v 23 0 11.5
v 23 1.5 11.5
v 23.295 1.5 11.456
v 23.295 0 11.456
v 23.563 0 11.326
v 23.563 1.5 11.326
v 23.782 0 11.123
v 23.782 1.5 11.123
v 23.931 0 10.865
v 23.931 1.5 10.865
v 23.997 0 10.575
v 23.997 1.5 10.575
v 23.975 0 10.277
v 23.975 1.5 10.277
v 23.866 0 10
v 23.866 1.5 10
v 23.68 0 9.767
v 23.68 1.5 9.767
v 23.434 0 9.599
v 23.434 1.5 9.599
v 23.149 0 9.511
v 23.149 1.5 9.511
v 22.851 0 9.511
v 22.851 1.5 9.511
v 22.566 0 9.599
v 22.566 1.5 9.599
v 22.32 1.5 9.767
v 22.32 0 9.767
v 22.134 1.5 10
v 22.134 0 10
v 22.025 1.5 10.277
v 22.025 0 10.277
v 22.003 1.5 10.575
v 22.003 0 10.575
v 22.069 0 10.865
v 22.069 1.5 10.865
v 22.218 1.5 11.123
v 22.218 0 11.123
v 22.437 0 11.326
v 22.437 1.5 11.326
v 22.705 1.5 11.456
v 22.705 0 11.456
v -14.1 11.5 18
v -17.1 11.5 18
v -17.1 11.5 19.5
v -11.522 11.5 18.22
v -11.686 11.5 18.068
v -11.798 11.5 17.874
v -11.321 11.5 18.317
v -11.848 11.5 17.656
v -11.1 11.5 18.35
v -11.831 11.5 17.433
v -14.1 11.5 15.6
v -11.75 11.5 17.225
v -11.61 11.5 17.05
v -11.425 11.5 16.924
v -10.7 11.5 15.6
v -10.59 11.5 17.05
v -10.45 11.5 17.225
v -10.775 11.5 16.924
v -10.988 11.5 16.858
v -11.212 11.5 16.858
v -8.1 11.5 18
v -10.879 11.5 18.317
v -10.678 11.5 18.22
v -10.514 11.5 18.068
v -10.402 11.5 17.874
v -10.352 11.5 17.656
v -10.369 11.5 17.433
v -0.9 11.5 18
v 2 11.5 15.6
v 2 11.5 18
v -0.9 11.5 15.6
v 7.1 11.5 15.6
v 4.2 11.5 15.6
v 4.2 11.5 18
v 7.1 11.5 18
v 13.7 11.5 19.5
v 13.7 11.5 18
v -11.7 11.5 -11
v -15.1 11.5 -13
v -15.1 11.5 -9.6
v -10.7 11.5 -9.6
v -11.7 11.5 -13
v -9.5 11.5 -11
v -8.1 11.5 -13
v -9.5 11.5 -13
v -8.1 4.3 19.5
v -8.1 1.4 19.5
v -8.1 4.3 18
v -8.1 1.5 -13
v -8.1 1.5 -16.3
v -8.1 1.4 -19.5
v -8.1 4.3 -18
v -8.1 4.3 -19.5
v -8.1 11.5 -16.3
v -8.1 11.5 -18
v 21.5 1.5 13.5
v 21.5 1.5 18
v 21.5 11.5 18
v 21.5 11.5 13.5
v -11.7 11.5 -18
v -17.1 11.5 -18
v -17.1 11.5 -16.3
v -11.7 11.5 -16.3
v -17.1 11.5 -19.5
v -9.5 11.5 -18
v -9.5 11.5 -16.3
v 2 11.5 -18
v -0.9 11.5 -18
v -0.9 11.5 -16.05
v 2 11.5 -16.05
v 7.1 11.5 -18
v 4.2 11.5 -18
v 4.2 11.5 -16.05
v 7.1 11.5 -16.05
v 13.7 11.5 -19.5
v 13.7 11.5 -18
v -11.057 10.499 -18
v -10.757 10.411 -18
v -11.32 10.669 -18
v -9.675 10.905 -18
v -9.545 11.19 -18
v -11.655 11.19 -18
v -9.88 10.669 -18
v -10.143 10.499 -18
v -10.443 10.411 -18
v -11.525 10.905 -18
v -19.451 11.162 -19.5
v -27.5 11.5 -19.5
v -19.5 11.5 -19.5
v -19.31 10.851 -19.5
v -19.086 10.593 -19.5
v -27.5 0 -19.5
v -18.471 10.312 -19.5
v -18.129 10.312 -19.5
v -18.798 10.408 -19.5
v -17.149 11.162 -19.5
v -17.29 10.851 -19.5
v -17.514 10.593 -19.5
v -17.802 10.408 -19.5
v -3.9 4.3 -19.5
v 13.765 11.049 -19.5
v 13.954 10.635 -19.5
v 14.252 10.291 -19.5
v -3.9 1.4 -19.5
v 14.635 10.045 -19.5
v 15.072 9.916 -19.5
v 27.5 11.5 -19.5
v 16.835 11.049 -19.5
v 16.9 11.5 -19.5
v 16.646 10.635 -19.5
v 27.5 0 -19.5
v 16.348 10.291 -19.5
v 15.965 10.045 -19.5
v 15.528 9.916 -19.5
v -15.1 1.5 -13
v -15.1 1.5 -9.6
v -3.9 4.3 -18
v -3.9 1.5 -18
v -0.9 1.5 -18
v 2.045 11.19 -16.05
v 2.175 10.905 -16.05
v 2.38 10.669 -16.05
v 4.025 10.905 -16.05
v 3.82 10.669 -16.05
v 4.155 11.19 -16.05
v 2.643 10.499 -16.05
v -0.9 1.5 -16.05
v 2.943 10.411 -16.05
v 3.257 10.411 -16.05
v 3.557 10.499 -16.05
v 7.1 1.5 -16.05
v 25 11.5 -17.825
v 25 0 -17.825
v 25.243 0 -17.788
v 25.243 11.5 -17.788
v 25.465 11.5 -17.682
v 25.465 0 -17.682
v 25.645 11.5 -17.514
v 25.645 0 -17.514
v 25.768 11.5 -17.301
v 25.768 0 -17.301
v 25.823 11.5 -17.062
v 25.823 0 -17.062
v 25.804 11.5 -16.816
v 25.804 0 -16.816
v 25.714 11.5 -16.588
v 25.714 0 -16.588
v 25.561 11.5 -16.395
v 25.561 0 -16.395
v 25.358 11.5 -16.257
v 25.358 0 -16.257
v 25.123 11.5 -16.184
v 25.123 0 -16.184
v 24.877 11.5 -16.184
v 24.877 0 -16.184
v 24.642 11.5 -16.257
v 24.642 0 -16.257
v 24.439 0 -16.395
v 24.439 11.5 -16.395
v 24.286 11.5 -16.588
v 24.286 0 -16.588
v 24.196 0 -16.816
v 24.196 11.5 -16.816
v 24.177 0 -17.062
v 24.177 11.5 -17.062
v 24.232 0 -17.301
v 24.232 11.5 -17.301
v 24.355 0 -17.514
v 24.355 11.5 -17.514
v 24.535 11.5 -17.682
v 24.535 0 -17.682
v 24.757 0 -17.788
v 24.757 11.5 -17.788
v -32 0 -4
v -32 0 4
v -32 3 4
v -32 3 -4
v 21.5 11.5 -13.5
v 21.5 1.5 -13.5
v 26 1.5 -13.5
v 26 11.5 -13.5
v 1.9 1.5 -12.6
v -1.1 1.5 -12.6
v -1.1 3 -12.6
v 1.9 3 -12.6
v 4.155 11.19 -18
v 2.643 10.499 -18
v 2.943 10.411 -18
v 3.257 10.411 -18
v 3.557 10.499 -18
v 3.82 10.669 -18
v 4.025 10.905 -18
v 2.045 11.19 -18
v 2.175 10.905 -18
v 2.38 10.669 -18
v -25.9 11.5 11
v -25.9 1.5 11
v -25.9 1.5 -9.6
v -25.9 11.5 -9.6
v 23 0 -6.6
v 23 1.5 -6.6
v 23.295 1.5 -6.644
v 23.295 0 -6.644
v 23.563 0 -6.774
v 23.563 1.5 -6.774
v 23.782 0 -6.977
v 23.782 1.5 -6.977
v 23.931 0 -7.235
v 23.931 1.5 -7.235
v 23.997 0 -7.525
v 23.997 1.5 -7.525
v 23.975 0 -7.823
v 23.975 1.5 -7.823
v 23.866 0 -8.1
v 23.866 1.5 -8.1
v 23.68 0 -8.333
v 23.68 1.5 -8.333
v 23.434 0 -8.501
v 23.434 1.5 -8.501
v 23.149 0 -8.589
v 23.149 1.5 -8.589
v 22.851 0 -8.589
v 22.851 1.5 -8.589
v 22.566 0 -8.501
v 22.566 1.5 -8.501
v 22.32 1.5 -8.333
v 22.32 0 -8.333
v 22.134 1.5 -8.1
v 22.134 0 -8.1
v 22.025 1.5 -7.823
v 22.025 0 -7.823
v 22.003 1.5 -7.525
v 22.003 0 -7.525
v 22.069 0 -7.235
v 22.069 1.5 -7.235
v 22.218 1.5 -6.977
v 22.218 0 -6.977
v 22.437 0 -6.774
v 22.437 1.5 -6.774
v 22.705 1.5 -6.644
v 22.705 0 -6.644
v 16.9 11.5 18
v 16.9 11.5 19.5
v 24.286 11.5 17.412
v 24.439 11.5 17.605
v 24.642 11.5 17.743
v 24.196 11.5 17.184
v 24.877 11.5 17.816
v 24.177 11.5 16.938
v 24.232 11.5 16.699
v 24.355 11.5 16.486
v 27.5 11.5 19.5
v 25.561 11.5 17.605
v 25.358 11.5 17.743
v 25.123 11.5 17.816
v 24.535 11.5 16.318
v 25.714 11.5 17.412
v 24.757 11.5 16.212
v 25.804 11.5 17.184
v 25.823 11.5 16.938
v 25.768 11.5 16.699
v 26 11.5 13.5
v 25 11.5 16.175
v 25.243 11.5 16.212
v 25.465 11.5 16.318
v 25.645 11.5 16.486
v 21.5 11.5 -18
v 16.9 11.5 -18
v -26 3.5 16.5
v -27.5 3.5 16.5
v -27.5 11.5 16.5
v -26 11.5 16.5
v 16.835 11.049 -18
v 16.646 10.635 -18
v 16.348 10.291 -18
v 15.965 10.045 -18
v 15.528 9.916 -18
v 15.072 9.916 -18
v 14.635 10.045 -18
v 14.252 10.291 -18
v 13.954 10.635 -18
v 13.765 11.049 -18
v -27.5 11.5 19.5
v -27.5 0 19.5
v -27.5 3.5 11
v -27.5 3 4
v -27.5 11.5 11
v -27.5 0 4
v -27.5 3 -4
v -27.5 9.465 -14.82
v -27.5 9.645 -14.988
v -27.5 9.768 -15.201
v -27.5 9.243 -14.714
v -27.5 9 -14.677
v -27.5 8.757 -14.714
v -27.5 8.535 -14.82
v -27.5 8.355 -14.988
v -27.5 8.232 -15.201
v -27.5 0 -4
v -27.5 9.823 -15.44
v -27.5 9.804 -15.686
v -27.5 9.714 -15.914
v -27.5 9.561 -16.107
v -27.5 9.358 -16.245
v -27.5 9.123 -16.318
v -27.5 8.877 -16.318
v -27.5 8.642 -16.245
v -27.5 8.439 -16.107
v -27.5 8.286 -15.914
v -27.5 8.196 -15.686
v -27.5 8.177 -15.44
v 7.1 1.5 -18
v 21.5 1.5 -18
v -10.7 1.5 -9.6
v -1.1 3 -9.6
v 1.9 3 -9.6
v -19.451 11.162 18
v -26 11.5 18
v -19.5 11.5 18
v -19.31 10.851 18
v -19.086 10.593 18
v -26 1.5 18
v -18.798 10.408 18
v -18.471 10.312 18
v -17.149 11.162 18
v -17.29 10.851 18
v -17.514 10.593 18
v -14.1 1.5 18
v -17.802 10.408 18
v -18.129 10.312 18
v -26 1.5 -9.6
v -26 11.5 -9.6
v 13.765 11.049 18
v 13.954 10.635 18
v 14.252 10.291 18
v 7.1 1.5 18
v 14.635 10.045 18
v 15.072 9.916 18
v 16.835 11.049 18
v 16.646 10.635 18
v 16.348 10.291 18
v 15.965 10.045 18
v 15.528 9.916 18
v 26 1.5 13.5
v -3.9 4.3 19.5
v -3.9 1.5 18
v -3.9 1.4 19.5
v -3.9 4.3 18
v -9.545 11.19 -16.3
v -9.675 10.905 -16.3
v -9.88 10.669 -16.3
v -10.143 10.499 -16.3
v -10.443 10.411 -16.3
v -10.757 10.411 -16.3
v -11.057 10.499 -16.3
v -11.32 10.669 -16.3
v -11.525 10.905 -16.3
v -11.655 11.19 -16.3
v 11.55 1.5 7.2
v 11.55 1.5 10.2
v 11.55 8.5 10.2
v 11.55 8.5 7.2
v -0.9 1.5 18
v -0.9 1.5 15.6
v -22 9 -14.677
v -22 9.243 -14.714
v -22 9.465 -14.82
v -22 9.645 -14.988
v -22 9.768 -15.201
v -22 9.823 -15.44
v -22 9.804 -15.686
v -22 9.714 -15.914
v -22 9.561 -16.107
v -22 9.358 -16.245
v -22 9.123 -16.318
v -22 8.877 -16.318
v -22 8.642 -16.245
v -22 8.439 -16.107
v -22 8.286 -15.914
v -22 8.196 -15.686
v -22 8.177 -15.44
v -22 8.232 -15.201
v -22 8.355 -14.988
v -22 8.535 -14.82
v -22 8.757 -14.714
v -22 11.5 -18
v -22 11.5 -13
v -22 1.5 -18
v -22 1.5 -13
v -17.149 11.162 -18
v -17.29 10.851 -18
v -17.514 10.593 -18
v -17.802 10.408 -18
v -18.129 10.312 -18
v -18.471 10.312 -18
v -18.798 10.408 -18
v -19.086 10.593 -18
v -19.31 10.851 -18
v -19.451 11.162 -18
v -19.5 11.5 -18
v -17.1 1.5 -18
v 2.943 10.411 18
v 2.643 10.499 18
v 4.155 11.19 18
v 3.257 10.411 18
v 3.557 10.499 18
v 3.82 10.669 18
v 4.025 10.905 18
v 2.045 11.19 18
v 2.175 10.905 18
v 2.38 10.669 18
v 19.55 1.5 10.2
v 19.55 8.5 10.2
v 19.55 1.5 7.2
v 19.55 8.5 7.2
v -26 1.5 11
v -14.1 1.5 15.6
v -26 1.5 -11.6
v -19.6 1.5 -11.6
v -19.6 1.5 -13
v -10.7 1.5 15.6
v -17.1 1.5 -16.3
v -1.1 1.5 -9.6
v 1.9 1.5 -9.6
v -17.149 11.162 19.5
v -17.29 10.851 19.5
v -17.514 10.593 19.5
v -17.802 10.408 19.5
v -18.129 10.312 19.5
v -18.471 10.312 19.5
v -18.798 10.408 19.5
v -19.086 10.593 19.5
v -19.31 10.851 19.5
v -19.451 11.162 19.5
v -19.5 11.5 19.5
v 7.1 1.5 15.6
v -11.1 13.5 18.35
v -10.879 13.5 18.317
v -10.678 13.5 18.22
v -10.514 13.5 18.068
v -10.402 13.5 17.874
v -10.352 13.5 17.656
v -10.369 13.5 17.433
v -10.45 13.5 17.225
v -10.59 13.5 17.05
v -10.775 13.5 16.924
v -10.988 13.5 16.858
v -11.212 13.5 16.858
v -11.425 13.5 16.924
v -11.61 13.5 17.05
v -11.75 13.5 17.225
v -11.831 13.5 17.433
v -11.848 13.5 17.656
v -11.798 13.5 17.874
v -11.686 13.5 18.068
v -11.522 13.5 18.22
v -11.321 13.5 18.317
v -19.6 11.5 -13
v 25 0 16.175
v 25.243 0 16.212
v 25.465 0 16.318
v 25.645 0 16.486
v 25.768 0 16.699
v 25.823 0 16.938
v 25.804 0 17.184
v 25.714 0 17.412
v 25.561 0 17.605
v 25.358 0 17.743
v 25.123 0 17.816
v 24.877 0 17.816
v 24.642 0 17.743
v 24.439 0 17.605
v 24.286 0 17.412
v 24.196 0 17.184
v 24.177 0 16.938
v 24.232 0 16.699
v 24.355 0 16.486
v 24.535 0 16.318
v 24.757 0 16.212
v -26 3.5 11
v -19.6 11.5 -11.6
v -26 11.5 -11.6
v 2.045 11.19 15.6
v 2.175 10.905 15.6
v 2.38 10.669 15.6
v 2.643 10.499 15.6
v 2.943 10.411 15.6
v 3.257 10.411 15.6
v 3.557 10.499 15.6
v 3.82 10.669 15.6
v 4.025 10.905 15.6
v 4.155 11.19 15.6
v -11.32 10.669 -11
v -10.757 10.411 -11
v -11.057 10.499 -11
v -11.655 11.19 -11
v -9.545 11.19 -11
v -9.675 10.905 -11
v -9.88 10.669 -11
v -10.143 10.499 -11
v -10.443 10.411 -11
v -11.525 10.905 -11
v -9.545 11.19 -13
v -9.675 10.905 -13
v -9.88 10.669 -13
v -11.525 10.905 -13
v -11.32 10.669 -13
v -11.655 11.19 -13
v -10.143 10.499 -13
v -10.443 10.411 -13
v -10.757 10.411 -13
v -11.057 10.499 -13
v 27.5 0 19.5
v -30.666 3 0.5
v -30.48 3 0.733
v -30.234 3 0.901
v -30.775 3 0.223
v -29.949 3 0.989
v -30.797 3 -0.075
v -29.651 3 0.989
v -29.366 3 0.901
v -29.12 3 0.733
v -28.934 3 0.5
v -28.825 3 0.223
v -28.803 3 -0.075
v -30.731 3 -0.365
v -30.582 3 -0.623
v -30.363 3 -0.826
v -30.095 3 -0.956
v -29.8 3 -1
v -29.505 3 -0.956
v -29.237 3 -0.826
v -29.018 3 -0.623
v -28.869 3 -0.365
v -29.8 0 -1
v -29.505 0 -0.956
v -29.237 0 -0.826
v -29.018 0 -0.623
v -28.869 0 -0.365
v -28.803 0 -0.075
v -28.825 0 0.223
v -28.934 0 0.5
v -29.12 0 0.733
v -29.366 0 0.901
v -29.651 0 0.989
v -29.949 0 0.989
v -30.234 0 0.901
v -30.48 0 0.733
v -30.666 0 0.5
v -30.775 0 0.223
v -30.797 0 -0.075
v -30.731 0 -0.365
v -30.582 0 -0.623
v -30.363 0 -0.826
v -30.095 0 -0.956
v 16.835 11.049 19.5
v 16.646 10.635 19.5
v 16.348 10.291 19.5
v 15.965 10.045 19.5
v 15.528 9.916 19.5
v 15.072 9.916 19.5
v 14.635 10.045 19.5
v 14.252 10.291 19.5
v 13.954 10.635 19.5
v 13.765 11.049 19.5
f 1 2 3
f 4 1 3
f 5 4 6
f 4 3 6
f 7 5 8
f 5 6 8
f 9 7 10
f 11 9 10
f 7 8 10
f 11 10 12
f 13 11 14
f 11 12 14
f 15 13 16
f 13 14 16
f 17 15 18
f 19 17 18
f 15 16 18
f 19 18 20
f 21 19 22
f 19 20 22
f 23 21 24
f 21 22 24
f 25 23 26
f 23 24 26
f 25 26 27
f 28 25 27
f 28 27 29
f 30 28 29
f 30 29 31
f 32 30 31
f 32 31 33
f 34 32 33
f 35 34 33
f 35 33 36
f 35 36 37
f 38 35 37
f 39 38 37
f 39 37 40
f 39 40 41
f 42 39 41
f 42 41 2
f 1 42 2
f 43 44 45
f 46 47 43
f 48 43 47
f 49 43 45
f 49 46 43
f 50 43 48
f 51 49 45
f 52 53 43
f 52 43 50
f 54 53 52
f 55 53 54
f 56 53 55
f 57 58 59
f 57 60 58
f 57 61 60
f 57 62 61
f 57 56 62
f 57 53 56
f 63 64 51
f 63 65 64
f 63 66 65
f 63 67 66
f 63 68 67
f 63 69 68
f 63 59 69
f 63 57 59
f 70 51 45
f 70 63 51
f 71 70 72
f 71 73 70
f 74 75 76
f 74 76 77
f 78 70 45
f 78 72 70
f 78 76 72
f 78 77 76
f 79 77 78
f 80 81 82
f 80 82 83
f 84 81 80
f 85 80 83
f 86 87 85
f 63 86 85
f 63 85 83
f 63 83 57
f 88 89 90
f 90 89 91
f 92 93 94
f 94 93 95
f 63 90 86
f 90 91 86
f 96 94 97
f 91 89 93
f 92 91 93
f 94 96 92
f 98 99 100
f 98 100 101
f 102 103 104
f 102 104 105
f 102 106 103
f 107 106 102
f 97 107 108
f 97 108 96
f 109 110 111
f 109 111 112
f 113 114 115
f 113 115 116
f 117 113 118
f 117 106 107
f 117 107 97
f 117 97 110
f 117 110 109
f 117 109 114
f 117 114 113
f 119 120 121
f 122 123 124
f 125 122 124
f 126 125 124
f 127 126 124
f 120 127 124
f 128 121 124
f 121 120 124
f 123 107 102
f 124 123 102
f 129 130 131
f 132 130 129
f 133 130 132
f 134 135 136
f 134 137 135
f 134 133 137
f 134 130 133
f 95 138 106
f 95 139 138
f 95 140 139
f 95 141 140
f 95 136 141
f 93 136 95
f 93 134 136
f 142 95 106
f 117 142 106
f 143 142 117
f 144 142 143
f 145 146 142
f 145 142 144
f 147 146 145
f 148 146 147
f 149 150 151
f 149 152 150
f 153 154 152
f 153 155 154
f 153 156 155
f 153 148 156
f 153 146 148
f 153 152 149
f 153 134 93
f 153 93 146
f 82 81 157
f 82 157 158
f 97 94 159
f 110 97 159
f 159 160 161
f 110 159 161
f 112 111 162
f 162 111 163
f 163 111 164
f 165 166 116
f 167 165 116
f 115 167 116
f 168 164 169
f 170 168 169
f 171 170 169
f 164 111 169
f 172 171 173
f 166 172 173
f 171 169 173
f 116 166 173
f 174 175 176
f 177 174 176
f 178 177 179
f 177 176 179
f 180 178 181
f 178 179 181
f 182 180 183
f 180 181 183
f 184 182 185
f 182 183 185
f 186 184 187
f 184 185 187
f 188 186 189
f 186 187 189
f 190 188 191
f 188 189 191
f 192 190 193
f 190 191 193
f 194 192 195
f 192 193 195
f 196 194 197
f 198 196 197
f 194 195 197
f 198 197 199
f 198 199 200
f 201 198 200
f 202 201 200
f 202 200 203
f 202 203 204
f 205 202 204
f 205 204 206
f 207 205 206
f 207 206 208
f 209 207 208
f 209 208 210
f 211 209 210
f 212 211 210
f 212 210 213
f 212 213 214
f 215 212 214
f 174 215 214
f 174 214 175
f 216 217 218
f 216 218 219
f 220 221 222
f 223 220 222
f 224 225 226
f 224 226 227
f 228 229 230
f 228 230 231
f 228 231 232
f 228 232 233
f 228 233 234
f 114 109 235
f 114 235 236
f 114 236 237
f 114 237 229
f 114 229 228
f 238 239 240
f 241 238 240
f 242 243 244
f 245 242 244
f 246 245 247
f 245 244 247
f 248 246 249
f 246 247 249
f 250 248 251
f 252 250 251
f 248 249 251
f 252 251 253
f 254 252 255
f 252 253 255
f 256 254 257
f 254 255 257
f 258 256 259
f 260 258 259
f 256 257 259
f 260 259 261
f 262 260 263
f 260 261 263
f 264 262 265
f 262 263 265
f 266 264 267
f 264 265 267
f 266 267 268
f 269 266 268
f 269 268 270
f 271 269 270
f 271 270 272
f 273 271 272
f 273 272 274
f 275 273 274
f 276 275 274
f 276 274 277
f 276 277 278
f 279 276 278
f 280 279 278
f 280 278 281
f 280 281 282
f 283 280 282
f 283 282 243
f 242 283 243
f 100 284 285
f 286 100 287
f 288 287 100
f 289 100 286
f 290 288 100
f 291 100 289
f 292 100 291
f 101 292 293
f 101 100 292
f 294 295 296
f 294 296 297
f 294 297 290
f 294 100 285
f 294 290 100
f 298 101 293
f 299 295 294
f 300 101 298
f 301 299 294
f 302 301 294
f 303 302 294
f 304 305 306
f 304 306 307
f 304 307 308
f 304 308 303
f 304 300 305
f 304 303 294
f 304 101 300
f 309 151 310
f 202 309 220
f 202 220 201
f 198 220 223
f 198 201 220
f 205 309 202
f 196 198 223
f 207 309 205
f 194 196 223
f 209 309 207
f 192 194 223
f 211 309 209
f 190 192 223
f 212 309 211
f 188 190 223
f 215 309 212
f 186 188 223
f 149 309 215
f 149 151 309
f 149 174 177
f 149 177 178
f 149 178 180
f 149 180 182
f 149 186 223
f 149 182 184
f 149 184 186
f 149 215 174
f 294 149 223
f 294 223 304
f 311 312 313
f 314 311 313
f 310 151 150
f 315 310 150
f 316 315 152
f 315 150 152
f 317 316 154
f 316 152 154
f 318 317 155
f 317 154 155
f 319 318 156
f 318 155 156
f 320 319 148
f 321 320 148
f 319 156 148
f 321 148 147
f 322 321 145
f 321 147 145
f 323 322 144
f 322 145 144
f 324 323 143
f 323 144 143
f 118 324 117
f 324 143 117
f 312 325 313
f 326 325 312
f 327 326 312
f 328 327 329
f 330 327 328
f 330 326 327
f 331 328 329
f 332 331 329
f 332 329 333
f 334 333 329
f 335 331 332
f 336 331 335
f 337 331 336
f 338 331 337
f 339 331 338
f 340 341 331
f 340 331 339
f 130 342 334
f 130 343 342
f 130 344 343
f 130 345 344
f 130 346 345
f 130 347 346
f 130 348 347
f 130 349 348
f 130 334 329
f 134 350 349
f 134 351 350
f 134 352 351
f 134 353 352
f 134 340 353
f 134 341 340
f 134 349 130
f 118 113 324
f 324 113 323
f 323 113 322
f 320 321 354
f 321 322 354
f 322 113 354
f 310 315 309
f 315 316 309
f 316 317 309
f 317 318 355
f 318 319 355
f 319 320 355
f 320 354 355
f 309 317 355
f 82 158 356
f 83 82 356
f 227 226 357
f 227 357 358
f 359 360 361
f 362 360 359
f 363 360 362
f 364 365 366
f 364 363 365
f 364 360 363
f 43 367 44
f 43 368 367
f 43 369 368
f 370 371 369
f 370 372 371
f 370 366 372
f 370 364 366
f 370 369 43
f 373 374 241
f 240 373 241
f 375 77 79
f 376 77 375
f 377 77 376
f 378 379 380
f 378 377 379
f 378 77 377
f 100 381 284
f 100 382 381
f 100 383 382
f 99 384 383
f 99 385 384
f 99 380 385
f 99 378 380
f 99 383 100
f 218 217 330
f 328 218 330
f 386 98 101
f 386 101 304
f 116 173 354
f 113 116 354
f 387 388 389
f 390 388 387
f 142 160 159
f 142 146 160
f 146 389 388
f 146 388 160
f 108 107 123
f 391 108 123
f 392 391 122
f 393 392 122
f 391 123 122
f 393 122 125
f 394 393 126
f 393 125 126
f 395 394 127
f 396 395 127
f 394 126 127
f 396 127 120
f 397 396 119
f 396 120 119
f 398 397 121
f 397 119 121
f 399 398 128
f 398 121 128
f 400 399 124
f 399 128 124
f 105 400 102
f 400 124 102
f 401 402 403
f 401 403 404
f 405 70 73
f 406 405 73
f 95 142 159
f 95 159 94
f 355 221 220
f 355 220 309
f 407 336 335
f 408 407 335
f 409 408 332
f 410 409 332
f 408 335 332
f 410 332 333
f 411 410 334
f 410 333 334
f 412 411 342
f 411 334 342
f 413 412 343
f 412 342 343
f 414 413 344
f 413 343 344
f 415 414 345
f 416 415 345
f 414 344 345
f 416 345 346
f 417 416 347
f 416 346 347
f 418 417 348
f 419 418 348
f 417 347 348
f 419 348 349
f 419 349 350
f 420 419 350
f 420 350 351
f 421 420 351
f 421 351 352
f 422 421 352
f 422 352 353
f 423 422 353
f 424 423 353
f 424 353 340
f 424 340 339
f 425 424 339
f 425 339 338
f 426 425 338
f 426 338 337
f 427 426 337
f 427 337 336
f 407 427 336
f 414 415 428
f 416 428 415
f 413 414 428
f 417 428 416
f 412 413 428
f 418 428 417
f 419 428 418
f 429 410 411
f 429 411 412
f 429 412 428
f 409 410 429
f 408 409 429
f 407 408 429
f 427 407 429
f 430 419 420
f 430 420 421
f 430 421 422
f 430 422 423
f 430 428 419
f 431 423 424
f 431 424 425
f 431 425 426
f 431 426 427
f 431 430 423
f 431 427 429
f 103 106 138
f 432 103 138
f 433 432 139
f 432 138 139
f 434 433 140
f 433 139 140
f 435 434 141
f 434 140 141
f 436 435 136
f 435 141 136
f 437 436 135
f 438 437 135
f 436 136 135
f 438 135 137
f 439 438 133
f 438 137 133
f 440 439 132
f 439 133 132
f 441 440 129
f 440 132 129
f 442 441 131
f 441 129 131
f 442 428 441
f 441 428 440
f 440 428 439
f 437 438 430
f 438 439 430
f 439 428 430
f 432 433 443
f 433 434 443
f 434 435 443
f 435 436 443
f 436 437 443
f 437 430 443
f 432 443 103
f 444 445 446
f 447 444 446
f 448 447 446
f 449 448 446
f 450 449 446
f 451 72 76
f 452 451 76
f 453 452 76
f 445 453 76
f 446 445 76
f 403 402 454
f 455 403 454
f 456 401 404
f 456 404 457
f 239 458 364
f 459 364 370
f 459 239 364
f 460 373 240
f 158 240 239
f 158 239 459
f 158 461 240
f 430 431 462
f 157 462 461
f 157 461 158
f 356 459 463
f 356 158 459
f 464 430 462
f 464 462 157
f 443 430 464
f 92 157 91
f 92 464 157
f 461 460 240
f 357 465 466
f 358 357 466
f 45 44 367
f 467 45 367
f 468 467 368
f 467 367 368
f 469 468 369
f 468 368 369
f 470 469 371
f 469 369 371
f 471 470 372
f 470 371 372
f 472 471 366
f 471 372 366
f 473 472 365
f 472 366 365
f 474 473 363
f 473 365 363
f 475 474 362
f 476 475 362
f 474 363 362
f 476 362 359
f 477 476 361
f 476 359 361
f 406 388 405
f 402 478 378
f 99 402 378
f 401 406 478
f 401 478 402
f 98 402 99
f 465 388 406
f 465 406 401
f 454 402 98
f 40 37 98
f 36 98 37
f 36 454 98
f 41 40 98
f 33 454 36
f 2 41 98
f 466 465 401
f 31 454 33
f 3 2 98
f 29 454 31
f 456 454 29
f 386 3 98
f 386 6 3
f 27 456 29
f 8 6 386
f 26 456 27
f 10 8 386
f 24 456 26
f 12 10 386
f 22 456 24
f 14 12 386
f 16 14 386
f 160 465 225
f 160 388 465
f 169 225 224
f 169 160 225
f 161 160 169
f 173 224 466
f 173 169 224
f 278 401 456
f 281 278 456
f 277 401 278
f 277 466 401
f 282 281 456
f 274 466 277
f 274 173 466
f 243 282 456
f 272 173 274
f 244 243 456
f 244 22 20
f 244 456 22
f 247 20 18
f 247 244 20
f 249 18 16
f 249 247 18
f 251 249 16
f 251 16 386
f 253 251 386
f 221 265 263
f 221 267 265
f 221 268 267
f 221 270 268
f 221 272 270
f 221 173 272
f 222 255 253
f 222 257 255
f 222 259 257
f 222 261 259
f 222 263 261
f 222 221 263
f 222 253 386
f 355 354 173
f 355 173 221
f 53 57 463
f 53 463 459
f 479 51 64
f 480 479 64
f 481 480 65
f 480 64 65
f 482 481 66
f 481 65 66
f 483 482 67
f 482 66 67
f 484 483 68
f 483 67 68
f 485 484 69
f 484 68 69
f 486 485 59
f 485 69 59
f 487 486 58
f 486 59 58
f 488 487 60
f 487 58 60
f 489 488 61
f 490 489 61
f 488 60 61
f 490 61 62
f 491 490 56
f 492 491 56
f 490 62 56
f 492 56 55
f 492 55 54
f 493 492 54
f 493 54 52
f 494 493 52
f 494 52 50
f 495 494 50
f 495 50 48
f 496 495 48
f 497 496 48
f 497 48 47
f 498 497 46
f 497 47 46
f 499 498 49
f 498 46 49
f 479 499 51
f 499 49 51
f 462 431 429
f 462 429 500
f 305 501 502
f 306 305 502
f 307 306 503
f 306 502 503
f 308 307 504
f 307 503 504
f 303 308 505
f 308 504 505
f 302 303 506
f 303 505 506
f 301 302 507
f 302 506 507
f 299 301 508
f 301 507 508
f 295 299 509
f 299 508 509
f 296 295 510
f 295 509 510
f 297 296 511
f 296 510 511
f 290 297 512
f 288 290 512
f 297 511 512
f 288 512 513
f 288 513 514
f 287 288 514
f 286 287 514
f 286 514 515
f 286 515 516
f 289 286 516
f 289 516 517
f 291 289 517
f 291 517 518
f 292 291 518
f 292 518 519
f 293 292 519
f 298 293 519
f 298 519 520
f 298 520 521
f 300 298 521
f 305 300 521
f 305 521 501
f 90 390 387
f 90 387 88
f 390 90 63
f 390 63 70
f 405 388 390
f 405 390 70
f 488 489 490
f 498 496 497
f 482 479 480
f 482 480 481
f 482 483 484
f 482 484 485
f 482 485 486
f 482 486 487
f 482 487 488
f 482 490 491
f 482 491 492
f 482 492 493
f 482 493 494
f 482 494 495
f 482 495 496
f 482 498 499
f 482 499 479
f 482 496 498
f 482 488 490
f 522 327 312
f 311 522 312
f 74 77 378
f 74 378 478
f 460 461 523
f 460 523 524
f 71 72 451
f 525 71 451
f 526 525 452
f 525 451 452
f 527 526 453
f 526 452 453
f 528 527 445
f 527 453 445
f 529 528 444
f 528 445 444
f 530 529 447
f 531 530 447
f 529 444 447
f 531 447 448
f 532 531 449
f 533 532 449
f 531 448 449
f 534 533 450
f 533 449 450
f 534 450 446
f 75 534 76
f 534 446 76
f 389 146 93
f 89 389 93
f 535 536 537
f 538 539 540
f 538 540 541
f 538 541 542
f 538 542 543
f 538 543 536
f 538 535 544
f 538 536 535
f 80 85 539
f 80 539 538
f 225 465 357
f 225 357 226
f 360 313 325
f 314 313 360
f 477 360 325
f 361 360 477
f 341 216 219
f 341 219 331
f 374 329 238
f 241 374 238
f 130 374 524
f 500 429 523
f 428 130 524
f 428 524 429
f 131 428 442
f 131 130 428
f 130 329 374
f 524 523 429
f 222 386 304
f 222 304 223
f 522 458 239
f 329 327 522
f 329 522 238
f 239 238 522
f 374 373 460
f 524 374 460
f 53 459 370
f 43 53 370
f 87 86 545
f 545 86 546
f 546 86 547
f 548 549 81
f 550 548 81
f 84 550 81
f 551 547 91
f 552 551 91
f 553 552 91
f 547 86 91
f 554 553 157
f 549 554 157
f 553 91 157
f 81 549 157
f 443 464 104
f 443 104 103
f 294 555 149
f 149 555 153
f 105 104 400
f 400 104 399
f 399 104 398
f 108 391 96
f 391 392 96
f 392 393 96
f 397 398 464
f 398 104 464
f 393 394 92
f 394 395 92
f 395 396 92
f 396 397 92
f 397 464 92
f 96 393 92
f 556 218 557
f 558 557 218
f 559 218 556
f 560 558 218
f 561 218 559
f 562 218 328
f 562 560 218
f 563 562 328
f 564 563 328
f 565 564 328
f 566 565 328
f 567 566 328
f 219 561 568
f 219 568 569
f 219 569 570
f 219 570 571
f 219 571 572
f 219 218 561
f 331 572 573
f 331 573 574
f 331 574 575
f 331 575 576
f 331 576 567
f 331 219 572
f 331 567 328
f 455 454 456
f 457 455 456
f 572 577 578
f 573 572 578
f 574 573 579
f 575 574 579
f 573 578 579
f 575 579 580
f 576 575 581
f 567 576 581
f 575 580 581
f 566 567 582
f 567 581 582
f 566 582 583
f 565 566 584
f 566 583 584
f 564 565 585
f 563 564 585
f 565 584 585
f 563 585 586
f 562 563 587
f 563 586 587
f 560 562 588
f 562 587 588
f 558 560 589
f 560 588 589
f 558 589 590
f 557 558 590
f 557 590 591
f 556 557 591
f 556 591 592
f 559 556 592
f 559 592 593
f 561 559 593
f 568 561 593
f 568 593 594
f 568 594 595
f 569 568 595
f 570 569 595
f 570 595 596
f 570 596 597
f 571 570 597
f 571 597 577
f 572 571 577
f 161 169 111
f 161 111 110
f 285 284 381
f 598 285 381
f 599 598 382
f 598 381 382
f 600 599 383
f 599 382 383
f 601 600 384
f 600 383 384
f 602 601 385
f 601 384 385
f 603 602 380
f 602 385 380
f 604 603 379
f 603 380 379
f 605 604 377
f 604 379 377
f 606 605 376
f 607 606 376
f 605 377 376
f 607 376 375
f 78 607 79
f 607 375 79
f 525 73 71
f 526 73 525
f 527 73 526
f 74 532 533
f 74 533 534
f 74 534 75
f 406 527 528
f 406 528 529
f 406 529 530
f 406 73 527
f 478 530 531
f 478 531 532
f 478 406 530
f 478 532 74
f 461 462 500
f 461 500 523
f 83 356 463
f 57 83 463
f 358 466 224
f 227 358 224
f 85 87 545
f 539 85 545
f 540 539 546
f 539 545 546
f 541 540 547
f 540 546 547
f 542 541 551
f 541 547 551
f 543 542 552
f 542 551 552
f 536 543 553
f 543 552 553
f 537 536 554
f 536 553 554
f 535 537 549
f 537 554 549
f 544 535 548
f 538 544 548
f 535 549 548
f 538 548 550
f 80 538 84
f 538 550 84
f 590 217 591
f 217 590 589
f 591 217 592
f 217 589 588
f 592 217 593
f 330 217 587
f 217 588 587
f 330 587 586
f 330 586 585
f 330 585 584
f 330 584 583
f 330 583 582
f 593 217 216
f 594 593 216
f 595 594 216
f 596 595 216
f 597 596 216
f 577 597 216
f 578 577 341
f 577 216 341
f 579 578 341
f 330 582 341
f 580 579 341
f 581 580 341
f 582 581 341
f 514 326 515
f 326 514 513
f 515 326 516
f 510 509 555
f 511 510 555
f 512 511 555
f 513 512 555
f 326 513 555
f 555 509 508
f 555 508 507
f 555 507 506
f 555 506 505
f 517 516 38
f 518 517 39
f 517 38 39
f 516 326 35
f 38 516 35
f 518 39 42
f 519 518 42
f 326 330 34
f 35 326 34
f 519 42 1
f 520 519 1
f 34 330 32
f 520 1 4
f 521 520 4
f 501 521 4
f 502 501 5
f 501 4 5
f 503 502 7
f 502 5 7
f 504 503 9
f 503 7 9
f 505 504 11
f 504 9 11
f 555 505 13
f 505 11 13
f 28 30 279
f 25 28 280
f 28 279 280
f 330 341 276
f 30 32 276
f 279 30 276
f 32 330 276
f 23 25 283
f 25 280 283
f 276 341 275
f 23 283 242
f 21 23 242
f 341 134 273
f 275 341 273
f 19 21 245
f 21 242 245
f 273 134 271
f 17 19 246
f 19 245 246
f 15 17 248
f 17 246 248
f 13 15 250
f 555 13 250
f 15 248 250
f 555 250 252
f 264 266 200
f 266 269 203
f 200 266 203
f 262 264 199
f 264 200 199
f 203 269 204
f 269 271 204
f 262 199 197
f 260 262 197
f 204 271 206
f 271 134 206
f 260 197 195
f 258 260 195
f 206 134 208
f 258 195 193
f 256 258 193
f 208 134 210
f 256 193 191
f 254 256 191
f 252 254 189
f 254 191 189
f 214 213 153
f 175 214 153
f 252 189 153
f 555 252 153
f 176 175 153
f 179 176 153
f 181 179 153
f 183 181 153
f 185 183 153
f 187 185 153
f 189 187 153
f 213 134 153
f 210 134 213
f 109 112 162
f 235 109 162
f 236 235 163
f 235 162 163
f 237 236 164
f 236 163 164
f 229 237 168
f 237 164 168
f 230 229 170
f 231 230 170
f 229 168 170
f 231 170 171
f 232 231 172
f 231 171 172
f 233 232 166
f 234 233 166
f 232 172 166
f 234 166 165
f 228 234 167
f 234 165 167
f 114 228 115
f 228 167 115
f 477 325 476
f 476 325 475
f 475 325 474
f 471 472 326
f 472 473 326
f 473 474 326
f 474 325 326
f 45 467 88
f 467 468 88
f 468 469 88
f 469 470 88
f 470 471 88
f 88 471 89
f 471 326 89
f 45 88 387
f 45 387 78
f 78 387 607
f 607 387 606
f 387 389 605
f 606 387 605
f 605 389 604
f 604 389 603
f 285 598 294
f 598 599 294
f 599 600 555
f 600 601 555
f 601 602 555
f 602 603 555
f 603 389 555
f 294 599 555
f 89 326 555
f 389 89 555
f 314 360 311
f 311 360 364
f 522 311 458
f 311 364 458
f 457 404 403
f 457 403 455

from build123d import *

# Parameters (mm, degrees)
SKETCH_1_W            = 55
SKETCH_1_H            = 39
EXTRUDE_1_DEPTH       = 11.5
SHELL_1_T             = -1.5
SKETCH_2_R            = 1.6
SKETCH_2_R_2          = 1.2
SKETCH_2_W            = 4.2
SKETCH_2_H            = 2.9
CUT_EXTRUDE_1_DEPTH   = 50.086658065
SKETCH_3_W            = 0.1
SKETCH_3_H            = 20.6
SKETCH_3_W_2          = 9
SKETCH_3_H_2          = 1.7
SKETCH_3_W_3          = 8
SKETCH_3_H_3          = 1.95
SKETCH_3_H_4          = 2.4
SKETCH_3_W_4          = 4.5
SKETCH_3_H_5          = 4.5
EXTRUDE_2_DEPTH       = 10
CUT_EXTRUDE_START     = -1.5
SKETCH_4_R            = 1.1
CUT_EXTRUDE_2_DEPTH   = 36
SKETCH_5_R            = 1.1
CUT_EXTRUDE_3_DEPTH   = 7
EXTRUDE_3_DEPTH       = 1.5
EXTRUDE_3_DEPTH_BACK  = 1.5
SKETCH_6_W            = 3
SKETCH_6_H            = 3
SKETCH_6_W_2          = 4.5
SKETCH_6_H_2          = 8
SKETCH_7_R            = 1
SKETCH_7_R_2          = 0.825
CUT_EXTRUDE_4_DEPTH   = 40.198214245
SKETCH_8_R            = 1
CUT_EXTRUDE_5_DEPTH   = 39.784661917
CUT_EXTRUDE_6_REACH   = 61.477
SKETCH_9_R            = 0.825
SKETCH_10_W           = 8
SKETCH_10_H           = 3
F_3MM_4_DEPTH         = 7
CUT_EXTRUDE_4_2_REACH = 61.477
SKETCH_11_W           = 5.5
SKETCH_11_H           = 8
SKETCH_12_R           = 0.75
EXTRUDE_5_DEPTH       = 2


with BuildPart() as part:
    # 草图1 → 凸台-拉伸1 (new body)
    with BuildSketch(Plane(origin=(0, 0, 0), x_dir=(1, 0, 0), z_dir=(0, 1, 0))):
        Rectangle(SKETCH_1_W, SKETCH_1_H)
    extrude(amount=EXTRUDE_1_DEPTH)

    # 抽壳1
    shell_1_openings = [part.faces().sort_by_distance(p)[0] for p in [
        (0, 11.5, 0),
    ]]
    offset(amount=SHELL_1_T, openings=shell_1_openings, kind=Kind.INTERSECTION)

    # 草图2 → 切除-拉伸1 (cut, through all)
    with BuildSketch(Plane(origin=(0, 0, -19.5), x_dir=(-1, 0, 0), z_dir=(0, 0, -1))):
        with Locations((-15.3, 11.5)):
            Circle(SKETCH_2_R)
        with Locations((18.3, 11.5)):
            Circle(SKETCH_2_R_2)
        with Locations((6, 2.85)):
            Rectangle(SKETCH_2_W, SKETCH_2_H)
    extrude(amount=-CUT_EXTRUDE_1_DEPTH, mode=Mode.SUBTRACT)

    # 草图3 → 凸台-拉伸2 (add)
    with BuildSketch(Plane(origin=(0, 1.5, 0), x_dir=(1, 0, 0), z_dir=(0, 1, 0))):
        Polygon((-10.7, 9.6), (-10.7, -15.6), (-14.1, -15.6), (-14.1, -18), (-10.7, -18), (-8.1, -18), (-8.1, 13), (-15.1, 13), (-15.1, 9.6), align=None)
        with Locations((-25.95, -0.7)):
            Rectangle(SKETCH_3_W, SKETCH_3_H)
        with Locations((-12.6, 17.15)):
            Rectangle(SKETCH_3_W_2, SKETCH_3_H_2)
        with Locations((3.1, 17.025)):
            Rectangle(SKETCH_3_W_3, SKETCH_3_H_3)
        with Locations((3.1, -16.8)):
            Rectangle(SKETCH_3_W_3, SKETCH_3_H_4)
        with Locations((23.75, 15.75)):
            Rectangle(SKETCH_3_W_4, SKETCH_3_H_5)
        with Locations((23.75, -15.75)):
            Rectangle(SKETCH_3_W_4, SKETCH_3_H_5)
        Polygon((-26, 18), (-22, 18), (-22, 13), (-19.6, 13), (-19.6, 11.6), (-26, 11.6), (-26, 13), align=None)
    extrude(amount=EXTRUDE_2_DEPTH)

    # 草图4 → 切除-拉伸2 (cut)
    with BuildSketch(Plane.XY.offset(19.5).offset(CUT_EXTRUDE_START)):
        with Locations((3.1, 11.5)):
            Circle(SKETCH_4_R)
    extrude(amount=-CUT_EXTRUDE_2_DEPTH, mode=Mode.SUBTRACT)

    # 草图5 → 切除-拉伸3 (cut)
    with BuildSketch(Plane(origin=(0, 0, -19.5), x_dir=(-1, 0, 0), z_dir=(0, 0, -1)).offset(CUT_EXTRUDE_START)):
        with Locations((10.6, 11.5)):
            Circle(SKETCH_5_R)
    extrude(amount=-CUT_EXTRUDE_3_DEPTH, mode=Mode.SUBTRACT)

    # 草图6 → 变速卡位凸台-拉伸3 (add, two sides: drawn at the far end of the back side and taken through both)
    with BuildSketch(Plane(origin=(0, 1.5, 0), x_dir=(1, 0, 0), z_dir=(0, 1, 0)).offset(-EXTRUDE_3_DEPTH_BACK)):
        with Locations((0.4, 11.1)):
            Rectangle(SKETCH_6_W, SKETCH_6_H)
        with Locations((-29.75, 0)):
            Rectangle(SKETCH_6_W_2, SKETCH_6_H_2)
    extrude(amount=EXTRUDE_3_DEPTH + EXTRUDE_3_DEPTH_BACK)

    # 草图7 → Cut-Extrude 4 (cut, through all)
    with BuildSketch(Plane.XZ):
        with Locations(Location((-29.8, 0, 0), (0, 0, 270))):
            Circle(SKETCH_7_R)
        with Locations(Location((25, 17, 0), (0, 0, 270))):
            Circle(SKETCH_7_R_2)
        with Locations(Location((25, -17, 0), (0, 0, 270))):
            Circle(SKETCH_7_R_2)
    extrude(amount=-CUT_EXTRUDE_4_DEPTH, mode=Mode.SUBTRACT)

    # 草图8 → 底部螺丝孔切除-拉伸5 (cut, through all)
    with BuildSketch(Plane(origin=(0, 1.5, 0), x_dir=(1, 0, 0), z_dir=(0, 1, 0))):
        with Locations(Location((23, 7.6, 0), (0, 0, 270))):
            Circle(SKETCH_8_R)
        with Locations(Location((23, -10.5, 0), (0, 0, 270))):
            Circle(SKETCH_8_R)
    extrude(amount=-CUT_EXTRUDE_5_DEPTH, mode=Mode.SUBTRACT)

    # 草图9 → 前螺丝孔切除-拉伸6 (cut, up to next)
    with BuildSketch(Plane.ZY.offset(27.5), mode=Mode.PRIVATE) as cut_extrude_6_sk1:
        with Locations((-15.501988962, 9)):
            Circle(SKETCH_9_R)
    cut_extrude_6_tool1 = extrude(cut_extrude_6_sk1.sketch, amount=-CUT_EXTRUDE_6_REACH, mode=Mode.PRIVATE) & part.part
    add(cut_extrude_6_tool1.solids().sort_by_distance((-27.5, 9, -15.501989))[0], mode=Mode.SUBTRACT)

    # 草图10 → 3mm轴卡位凸台-拉伸4 (add)
    with BuildSketch(Plane(origin=(0, 1.5, 0), x_dir=(1, 0, 0), z_dir=(0, 1, 0))):
        with Locations((15.55, -8.7)):
            Rectangle(SKETCH_10_W, SKETCH_10_H)
    extrude(amount=F_3MM_4_DEPTH)

    # 草图11 → Cut-Extrude 4 2 (cut, up to next)
    with BuildSketch(Plane.ZY.offset(27.5), mode=Mode.PRIVATE) as cut_extrude_4_2_sk1:
        with Locations((13.75, 7.5)):
            Rectangle(SKETCH_11_W, SKETCH_11_H)
    cut_extrude_4_2_tool1 = extrude(cut_extrude_4_2_sk1.sketch, amount=-CUT_EXTRUDE_4_2_REACH, mode=Mode.PRIVATE) & part.part
    add(cut_extrude_4_2_tool1.solids().sort_by_distance((-27.5, 7.5, 13.75))[0], mode=Mode.SUBTRACT)

    # 草图12 → 凸台-拉伸5 (add)
    with BuildSketch(Plane(origin=(0, 11.5, 0), x_dir=(1, 0, 0), z_dir=(0, 1, 0))):
        with Locations(Location((-11.1, -17.6, 0), (0, 0, 270))):
            Circle(SKETCH_12_R)
    extrude(amount=EXTRUDE_5_DEPTH)


solid = part.part
